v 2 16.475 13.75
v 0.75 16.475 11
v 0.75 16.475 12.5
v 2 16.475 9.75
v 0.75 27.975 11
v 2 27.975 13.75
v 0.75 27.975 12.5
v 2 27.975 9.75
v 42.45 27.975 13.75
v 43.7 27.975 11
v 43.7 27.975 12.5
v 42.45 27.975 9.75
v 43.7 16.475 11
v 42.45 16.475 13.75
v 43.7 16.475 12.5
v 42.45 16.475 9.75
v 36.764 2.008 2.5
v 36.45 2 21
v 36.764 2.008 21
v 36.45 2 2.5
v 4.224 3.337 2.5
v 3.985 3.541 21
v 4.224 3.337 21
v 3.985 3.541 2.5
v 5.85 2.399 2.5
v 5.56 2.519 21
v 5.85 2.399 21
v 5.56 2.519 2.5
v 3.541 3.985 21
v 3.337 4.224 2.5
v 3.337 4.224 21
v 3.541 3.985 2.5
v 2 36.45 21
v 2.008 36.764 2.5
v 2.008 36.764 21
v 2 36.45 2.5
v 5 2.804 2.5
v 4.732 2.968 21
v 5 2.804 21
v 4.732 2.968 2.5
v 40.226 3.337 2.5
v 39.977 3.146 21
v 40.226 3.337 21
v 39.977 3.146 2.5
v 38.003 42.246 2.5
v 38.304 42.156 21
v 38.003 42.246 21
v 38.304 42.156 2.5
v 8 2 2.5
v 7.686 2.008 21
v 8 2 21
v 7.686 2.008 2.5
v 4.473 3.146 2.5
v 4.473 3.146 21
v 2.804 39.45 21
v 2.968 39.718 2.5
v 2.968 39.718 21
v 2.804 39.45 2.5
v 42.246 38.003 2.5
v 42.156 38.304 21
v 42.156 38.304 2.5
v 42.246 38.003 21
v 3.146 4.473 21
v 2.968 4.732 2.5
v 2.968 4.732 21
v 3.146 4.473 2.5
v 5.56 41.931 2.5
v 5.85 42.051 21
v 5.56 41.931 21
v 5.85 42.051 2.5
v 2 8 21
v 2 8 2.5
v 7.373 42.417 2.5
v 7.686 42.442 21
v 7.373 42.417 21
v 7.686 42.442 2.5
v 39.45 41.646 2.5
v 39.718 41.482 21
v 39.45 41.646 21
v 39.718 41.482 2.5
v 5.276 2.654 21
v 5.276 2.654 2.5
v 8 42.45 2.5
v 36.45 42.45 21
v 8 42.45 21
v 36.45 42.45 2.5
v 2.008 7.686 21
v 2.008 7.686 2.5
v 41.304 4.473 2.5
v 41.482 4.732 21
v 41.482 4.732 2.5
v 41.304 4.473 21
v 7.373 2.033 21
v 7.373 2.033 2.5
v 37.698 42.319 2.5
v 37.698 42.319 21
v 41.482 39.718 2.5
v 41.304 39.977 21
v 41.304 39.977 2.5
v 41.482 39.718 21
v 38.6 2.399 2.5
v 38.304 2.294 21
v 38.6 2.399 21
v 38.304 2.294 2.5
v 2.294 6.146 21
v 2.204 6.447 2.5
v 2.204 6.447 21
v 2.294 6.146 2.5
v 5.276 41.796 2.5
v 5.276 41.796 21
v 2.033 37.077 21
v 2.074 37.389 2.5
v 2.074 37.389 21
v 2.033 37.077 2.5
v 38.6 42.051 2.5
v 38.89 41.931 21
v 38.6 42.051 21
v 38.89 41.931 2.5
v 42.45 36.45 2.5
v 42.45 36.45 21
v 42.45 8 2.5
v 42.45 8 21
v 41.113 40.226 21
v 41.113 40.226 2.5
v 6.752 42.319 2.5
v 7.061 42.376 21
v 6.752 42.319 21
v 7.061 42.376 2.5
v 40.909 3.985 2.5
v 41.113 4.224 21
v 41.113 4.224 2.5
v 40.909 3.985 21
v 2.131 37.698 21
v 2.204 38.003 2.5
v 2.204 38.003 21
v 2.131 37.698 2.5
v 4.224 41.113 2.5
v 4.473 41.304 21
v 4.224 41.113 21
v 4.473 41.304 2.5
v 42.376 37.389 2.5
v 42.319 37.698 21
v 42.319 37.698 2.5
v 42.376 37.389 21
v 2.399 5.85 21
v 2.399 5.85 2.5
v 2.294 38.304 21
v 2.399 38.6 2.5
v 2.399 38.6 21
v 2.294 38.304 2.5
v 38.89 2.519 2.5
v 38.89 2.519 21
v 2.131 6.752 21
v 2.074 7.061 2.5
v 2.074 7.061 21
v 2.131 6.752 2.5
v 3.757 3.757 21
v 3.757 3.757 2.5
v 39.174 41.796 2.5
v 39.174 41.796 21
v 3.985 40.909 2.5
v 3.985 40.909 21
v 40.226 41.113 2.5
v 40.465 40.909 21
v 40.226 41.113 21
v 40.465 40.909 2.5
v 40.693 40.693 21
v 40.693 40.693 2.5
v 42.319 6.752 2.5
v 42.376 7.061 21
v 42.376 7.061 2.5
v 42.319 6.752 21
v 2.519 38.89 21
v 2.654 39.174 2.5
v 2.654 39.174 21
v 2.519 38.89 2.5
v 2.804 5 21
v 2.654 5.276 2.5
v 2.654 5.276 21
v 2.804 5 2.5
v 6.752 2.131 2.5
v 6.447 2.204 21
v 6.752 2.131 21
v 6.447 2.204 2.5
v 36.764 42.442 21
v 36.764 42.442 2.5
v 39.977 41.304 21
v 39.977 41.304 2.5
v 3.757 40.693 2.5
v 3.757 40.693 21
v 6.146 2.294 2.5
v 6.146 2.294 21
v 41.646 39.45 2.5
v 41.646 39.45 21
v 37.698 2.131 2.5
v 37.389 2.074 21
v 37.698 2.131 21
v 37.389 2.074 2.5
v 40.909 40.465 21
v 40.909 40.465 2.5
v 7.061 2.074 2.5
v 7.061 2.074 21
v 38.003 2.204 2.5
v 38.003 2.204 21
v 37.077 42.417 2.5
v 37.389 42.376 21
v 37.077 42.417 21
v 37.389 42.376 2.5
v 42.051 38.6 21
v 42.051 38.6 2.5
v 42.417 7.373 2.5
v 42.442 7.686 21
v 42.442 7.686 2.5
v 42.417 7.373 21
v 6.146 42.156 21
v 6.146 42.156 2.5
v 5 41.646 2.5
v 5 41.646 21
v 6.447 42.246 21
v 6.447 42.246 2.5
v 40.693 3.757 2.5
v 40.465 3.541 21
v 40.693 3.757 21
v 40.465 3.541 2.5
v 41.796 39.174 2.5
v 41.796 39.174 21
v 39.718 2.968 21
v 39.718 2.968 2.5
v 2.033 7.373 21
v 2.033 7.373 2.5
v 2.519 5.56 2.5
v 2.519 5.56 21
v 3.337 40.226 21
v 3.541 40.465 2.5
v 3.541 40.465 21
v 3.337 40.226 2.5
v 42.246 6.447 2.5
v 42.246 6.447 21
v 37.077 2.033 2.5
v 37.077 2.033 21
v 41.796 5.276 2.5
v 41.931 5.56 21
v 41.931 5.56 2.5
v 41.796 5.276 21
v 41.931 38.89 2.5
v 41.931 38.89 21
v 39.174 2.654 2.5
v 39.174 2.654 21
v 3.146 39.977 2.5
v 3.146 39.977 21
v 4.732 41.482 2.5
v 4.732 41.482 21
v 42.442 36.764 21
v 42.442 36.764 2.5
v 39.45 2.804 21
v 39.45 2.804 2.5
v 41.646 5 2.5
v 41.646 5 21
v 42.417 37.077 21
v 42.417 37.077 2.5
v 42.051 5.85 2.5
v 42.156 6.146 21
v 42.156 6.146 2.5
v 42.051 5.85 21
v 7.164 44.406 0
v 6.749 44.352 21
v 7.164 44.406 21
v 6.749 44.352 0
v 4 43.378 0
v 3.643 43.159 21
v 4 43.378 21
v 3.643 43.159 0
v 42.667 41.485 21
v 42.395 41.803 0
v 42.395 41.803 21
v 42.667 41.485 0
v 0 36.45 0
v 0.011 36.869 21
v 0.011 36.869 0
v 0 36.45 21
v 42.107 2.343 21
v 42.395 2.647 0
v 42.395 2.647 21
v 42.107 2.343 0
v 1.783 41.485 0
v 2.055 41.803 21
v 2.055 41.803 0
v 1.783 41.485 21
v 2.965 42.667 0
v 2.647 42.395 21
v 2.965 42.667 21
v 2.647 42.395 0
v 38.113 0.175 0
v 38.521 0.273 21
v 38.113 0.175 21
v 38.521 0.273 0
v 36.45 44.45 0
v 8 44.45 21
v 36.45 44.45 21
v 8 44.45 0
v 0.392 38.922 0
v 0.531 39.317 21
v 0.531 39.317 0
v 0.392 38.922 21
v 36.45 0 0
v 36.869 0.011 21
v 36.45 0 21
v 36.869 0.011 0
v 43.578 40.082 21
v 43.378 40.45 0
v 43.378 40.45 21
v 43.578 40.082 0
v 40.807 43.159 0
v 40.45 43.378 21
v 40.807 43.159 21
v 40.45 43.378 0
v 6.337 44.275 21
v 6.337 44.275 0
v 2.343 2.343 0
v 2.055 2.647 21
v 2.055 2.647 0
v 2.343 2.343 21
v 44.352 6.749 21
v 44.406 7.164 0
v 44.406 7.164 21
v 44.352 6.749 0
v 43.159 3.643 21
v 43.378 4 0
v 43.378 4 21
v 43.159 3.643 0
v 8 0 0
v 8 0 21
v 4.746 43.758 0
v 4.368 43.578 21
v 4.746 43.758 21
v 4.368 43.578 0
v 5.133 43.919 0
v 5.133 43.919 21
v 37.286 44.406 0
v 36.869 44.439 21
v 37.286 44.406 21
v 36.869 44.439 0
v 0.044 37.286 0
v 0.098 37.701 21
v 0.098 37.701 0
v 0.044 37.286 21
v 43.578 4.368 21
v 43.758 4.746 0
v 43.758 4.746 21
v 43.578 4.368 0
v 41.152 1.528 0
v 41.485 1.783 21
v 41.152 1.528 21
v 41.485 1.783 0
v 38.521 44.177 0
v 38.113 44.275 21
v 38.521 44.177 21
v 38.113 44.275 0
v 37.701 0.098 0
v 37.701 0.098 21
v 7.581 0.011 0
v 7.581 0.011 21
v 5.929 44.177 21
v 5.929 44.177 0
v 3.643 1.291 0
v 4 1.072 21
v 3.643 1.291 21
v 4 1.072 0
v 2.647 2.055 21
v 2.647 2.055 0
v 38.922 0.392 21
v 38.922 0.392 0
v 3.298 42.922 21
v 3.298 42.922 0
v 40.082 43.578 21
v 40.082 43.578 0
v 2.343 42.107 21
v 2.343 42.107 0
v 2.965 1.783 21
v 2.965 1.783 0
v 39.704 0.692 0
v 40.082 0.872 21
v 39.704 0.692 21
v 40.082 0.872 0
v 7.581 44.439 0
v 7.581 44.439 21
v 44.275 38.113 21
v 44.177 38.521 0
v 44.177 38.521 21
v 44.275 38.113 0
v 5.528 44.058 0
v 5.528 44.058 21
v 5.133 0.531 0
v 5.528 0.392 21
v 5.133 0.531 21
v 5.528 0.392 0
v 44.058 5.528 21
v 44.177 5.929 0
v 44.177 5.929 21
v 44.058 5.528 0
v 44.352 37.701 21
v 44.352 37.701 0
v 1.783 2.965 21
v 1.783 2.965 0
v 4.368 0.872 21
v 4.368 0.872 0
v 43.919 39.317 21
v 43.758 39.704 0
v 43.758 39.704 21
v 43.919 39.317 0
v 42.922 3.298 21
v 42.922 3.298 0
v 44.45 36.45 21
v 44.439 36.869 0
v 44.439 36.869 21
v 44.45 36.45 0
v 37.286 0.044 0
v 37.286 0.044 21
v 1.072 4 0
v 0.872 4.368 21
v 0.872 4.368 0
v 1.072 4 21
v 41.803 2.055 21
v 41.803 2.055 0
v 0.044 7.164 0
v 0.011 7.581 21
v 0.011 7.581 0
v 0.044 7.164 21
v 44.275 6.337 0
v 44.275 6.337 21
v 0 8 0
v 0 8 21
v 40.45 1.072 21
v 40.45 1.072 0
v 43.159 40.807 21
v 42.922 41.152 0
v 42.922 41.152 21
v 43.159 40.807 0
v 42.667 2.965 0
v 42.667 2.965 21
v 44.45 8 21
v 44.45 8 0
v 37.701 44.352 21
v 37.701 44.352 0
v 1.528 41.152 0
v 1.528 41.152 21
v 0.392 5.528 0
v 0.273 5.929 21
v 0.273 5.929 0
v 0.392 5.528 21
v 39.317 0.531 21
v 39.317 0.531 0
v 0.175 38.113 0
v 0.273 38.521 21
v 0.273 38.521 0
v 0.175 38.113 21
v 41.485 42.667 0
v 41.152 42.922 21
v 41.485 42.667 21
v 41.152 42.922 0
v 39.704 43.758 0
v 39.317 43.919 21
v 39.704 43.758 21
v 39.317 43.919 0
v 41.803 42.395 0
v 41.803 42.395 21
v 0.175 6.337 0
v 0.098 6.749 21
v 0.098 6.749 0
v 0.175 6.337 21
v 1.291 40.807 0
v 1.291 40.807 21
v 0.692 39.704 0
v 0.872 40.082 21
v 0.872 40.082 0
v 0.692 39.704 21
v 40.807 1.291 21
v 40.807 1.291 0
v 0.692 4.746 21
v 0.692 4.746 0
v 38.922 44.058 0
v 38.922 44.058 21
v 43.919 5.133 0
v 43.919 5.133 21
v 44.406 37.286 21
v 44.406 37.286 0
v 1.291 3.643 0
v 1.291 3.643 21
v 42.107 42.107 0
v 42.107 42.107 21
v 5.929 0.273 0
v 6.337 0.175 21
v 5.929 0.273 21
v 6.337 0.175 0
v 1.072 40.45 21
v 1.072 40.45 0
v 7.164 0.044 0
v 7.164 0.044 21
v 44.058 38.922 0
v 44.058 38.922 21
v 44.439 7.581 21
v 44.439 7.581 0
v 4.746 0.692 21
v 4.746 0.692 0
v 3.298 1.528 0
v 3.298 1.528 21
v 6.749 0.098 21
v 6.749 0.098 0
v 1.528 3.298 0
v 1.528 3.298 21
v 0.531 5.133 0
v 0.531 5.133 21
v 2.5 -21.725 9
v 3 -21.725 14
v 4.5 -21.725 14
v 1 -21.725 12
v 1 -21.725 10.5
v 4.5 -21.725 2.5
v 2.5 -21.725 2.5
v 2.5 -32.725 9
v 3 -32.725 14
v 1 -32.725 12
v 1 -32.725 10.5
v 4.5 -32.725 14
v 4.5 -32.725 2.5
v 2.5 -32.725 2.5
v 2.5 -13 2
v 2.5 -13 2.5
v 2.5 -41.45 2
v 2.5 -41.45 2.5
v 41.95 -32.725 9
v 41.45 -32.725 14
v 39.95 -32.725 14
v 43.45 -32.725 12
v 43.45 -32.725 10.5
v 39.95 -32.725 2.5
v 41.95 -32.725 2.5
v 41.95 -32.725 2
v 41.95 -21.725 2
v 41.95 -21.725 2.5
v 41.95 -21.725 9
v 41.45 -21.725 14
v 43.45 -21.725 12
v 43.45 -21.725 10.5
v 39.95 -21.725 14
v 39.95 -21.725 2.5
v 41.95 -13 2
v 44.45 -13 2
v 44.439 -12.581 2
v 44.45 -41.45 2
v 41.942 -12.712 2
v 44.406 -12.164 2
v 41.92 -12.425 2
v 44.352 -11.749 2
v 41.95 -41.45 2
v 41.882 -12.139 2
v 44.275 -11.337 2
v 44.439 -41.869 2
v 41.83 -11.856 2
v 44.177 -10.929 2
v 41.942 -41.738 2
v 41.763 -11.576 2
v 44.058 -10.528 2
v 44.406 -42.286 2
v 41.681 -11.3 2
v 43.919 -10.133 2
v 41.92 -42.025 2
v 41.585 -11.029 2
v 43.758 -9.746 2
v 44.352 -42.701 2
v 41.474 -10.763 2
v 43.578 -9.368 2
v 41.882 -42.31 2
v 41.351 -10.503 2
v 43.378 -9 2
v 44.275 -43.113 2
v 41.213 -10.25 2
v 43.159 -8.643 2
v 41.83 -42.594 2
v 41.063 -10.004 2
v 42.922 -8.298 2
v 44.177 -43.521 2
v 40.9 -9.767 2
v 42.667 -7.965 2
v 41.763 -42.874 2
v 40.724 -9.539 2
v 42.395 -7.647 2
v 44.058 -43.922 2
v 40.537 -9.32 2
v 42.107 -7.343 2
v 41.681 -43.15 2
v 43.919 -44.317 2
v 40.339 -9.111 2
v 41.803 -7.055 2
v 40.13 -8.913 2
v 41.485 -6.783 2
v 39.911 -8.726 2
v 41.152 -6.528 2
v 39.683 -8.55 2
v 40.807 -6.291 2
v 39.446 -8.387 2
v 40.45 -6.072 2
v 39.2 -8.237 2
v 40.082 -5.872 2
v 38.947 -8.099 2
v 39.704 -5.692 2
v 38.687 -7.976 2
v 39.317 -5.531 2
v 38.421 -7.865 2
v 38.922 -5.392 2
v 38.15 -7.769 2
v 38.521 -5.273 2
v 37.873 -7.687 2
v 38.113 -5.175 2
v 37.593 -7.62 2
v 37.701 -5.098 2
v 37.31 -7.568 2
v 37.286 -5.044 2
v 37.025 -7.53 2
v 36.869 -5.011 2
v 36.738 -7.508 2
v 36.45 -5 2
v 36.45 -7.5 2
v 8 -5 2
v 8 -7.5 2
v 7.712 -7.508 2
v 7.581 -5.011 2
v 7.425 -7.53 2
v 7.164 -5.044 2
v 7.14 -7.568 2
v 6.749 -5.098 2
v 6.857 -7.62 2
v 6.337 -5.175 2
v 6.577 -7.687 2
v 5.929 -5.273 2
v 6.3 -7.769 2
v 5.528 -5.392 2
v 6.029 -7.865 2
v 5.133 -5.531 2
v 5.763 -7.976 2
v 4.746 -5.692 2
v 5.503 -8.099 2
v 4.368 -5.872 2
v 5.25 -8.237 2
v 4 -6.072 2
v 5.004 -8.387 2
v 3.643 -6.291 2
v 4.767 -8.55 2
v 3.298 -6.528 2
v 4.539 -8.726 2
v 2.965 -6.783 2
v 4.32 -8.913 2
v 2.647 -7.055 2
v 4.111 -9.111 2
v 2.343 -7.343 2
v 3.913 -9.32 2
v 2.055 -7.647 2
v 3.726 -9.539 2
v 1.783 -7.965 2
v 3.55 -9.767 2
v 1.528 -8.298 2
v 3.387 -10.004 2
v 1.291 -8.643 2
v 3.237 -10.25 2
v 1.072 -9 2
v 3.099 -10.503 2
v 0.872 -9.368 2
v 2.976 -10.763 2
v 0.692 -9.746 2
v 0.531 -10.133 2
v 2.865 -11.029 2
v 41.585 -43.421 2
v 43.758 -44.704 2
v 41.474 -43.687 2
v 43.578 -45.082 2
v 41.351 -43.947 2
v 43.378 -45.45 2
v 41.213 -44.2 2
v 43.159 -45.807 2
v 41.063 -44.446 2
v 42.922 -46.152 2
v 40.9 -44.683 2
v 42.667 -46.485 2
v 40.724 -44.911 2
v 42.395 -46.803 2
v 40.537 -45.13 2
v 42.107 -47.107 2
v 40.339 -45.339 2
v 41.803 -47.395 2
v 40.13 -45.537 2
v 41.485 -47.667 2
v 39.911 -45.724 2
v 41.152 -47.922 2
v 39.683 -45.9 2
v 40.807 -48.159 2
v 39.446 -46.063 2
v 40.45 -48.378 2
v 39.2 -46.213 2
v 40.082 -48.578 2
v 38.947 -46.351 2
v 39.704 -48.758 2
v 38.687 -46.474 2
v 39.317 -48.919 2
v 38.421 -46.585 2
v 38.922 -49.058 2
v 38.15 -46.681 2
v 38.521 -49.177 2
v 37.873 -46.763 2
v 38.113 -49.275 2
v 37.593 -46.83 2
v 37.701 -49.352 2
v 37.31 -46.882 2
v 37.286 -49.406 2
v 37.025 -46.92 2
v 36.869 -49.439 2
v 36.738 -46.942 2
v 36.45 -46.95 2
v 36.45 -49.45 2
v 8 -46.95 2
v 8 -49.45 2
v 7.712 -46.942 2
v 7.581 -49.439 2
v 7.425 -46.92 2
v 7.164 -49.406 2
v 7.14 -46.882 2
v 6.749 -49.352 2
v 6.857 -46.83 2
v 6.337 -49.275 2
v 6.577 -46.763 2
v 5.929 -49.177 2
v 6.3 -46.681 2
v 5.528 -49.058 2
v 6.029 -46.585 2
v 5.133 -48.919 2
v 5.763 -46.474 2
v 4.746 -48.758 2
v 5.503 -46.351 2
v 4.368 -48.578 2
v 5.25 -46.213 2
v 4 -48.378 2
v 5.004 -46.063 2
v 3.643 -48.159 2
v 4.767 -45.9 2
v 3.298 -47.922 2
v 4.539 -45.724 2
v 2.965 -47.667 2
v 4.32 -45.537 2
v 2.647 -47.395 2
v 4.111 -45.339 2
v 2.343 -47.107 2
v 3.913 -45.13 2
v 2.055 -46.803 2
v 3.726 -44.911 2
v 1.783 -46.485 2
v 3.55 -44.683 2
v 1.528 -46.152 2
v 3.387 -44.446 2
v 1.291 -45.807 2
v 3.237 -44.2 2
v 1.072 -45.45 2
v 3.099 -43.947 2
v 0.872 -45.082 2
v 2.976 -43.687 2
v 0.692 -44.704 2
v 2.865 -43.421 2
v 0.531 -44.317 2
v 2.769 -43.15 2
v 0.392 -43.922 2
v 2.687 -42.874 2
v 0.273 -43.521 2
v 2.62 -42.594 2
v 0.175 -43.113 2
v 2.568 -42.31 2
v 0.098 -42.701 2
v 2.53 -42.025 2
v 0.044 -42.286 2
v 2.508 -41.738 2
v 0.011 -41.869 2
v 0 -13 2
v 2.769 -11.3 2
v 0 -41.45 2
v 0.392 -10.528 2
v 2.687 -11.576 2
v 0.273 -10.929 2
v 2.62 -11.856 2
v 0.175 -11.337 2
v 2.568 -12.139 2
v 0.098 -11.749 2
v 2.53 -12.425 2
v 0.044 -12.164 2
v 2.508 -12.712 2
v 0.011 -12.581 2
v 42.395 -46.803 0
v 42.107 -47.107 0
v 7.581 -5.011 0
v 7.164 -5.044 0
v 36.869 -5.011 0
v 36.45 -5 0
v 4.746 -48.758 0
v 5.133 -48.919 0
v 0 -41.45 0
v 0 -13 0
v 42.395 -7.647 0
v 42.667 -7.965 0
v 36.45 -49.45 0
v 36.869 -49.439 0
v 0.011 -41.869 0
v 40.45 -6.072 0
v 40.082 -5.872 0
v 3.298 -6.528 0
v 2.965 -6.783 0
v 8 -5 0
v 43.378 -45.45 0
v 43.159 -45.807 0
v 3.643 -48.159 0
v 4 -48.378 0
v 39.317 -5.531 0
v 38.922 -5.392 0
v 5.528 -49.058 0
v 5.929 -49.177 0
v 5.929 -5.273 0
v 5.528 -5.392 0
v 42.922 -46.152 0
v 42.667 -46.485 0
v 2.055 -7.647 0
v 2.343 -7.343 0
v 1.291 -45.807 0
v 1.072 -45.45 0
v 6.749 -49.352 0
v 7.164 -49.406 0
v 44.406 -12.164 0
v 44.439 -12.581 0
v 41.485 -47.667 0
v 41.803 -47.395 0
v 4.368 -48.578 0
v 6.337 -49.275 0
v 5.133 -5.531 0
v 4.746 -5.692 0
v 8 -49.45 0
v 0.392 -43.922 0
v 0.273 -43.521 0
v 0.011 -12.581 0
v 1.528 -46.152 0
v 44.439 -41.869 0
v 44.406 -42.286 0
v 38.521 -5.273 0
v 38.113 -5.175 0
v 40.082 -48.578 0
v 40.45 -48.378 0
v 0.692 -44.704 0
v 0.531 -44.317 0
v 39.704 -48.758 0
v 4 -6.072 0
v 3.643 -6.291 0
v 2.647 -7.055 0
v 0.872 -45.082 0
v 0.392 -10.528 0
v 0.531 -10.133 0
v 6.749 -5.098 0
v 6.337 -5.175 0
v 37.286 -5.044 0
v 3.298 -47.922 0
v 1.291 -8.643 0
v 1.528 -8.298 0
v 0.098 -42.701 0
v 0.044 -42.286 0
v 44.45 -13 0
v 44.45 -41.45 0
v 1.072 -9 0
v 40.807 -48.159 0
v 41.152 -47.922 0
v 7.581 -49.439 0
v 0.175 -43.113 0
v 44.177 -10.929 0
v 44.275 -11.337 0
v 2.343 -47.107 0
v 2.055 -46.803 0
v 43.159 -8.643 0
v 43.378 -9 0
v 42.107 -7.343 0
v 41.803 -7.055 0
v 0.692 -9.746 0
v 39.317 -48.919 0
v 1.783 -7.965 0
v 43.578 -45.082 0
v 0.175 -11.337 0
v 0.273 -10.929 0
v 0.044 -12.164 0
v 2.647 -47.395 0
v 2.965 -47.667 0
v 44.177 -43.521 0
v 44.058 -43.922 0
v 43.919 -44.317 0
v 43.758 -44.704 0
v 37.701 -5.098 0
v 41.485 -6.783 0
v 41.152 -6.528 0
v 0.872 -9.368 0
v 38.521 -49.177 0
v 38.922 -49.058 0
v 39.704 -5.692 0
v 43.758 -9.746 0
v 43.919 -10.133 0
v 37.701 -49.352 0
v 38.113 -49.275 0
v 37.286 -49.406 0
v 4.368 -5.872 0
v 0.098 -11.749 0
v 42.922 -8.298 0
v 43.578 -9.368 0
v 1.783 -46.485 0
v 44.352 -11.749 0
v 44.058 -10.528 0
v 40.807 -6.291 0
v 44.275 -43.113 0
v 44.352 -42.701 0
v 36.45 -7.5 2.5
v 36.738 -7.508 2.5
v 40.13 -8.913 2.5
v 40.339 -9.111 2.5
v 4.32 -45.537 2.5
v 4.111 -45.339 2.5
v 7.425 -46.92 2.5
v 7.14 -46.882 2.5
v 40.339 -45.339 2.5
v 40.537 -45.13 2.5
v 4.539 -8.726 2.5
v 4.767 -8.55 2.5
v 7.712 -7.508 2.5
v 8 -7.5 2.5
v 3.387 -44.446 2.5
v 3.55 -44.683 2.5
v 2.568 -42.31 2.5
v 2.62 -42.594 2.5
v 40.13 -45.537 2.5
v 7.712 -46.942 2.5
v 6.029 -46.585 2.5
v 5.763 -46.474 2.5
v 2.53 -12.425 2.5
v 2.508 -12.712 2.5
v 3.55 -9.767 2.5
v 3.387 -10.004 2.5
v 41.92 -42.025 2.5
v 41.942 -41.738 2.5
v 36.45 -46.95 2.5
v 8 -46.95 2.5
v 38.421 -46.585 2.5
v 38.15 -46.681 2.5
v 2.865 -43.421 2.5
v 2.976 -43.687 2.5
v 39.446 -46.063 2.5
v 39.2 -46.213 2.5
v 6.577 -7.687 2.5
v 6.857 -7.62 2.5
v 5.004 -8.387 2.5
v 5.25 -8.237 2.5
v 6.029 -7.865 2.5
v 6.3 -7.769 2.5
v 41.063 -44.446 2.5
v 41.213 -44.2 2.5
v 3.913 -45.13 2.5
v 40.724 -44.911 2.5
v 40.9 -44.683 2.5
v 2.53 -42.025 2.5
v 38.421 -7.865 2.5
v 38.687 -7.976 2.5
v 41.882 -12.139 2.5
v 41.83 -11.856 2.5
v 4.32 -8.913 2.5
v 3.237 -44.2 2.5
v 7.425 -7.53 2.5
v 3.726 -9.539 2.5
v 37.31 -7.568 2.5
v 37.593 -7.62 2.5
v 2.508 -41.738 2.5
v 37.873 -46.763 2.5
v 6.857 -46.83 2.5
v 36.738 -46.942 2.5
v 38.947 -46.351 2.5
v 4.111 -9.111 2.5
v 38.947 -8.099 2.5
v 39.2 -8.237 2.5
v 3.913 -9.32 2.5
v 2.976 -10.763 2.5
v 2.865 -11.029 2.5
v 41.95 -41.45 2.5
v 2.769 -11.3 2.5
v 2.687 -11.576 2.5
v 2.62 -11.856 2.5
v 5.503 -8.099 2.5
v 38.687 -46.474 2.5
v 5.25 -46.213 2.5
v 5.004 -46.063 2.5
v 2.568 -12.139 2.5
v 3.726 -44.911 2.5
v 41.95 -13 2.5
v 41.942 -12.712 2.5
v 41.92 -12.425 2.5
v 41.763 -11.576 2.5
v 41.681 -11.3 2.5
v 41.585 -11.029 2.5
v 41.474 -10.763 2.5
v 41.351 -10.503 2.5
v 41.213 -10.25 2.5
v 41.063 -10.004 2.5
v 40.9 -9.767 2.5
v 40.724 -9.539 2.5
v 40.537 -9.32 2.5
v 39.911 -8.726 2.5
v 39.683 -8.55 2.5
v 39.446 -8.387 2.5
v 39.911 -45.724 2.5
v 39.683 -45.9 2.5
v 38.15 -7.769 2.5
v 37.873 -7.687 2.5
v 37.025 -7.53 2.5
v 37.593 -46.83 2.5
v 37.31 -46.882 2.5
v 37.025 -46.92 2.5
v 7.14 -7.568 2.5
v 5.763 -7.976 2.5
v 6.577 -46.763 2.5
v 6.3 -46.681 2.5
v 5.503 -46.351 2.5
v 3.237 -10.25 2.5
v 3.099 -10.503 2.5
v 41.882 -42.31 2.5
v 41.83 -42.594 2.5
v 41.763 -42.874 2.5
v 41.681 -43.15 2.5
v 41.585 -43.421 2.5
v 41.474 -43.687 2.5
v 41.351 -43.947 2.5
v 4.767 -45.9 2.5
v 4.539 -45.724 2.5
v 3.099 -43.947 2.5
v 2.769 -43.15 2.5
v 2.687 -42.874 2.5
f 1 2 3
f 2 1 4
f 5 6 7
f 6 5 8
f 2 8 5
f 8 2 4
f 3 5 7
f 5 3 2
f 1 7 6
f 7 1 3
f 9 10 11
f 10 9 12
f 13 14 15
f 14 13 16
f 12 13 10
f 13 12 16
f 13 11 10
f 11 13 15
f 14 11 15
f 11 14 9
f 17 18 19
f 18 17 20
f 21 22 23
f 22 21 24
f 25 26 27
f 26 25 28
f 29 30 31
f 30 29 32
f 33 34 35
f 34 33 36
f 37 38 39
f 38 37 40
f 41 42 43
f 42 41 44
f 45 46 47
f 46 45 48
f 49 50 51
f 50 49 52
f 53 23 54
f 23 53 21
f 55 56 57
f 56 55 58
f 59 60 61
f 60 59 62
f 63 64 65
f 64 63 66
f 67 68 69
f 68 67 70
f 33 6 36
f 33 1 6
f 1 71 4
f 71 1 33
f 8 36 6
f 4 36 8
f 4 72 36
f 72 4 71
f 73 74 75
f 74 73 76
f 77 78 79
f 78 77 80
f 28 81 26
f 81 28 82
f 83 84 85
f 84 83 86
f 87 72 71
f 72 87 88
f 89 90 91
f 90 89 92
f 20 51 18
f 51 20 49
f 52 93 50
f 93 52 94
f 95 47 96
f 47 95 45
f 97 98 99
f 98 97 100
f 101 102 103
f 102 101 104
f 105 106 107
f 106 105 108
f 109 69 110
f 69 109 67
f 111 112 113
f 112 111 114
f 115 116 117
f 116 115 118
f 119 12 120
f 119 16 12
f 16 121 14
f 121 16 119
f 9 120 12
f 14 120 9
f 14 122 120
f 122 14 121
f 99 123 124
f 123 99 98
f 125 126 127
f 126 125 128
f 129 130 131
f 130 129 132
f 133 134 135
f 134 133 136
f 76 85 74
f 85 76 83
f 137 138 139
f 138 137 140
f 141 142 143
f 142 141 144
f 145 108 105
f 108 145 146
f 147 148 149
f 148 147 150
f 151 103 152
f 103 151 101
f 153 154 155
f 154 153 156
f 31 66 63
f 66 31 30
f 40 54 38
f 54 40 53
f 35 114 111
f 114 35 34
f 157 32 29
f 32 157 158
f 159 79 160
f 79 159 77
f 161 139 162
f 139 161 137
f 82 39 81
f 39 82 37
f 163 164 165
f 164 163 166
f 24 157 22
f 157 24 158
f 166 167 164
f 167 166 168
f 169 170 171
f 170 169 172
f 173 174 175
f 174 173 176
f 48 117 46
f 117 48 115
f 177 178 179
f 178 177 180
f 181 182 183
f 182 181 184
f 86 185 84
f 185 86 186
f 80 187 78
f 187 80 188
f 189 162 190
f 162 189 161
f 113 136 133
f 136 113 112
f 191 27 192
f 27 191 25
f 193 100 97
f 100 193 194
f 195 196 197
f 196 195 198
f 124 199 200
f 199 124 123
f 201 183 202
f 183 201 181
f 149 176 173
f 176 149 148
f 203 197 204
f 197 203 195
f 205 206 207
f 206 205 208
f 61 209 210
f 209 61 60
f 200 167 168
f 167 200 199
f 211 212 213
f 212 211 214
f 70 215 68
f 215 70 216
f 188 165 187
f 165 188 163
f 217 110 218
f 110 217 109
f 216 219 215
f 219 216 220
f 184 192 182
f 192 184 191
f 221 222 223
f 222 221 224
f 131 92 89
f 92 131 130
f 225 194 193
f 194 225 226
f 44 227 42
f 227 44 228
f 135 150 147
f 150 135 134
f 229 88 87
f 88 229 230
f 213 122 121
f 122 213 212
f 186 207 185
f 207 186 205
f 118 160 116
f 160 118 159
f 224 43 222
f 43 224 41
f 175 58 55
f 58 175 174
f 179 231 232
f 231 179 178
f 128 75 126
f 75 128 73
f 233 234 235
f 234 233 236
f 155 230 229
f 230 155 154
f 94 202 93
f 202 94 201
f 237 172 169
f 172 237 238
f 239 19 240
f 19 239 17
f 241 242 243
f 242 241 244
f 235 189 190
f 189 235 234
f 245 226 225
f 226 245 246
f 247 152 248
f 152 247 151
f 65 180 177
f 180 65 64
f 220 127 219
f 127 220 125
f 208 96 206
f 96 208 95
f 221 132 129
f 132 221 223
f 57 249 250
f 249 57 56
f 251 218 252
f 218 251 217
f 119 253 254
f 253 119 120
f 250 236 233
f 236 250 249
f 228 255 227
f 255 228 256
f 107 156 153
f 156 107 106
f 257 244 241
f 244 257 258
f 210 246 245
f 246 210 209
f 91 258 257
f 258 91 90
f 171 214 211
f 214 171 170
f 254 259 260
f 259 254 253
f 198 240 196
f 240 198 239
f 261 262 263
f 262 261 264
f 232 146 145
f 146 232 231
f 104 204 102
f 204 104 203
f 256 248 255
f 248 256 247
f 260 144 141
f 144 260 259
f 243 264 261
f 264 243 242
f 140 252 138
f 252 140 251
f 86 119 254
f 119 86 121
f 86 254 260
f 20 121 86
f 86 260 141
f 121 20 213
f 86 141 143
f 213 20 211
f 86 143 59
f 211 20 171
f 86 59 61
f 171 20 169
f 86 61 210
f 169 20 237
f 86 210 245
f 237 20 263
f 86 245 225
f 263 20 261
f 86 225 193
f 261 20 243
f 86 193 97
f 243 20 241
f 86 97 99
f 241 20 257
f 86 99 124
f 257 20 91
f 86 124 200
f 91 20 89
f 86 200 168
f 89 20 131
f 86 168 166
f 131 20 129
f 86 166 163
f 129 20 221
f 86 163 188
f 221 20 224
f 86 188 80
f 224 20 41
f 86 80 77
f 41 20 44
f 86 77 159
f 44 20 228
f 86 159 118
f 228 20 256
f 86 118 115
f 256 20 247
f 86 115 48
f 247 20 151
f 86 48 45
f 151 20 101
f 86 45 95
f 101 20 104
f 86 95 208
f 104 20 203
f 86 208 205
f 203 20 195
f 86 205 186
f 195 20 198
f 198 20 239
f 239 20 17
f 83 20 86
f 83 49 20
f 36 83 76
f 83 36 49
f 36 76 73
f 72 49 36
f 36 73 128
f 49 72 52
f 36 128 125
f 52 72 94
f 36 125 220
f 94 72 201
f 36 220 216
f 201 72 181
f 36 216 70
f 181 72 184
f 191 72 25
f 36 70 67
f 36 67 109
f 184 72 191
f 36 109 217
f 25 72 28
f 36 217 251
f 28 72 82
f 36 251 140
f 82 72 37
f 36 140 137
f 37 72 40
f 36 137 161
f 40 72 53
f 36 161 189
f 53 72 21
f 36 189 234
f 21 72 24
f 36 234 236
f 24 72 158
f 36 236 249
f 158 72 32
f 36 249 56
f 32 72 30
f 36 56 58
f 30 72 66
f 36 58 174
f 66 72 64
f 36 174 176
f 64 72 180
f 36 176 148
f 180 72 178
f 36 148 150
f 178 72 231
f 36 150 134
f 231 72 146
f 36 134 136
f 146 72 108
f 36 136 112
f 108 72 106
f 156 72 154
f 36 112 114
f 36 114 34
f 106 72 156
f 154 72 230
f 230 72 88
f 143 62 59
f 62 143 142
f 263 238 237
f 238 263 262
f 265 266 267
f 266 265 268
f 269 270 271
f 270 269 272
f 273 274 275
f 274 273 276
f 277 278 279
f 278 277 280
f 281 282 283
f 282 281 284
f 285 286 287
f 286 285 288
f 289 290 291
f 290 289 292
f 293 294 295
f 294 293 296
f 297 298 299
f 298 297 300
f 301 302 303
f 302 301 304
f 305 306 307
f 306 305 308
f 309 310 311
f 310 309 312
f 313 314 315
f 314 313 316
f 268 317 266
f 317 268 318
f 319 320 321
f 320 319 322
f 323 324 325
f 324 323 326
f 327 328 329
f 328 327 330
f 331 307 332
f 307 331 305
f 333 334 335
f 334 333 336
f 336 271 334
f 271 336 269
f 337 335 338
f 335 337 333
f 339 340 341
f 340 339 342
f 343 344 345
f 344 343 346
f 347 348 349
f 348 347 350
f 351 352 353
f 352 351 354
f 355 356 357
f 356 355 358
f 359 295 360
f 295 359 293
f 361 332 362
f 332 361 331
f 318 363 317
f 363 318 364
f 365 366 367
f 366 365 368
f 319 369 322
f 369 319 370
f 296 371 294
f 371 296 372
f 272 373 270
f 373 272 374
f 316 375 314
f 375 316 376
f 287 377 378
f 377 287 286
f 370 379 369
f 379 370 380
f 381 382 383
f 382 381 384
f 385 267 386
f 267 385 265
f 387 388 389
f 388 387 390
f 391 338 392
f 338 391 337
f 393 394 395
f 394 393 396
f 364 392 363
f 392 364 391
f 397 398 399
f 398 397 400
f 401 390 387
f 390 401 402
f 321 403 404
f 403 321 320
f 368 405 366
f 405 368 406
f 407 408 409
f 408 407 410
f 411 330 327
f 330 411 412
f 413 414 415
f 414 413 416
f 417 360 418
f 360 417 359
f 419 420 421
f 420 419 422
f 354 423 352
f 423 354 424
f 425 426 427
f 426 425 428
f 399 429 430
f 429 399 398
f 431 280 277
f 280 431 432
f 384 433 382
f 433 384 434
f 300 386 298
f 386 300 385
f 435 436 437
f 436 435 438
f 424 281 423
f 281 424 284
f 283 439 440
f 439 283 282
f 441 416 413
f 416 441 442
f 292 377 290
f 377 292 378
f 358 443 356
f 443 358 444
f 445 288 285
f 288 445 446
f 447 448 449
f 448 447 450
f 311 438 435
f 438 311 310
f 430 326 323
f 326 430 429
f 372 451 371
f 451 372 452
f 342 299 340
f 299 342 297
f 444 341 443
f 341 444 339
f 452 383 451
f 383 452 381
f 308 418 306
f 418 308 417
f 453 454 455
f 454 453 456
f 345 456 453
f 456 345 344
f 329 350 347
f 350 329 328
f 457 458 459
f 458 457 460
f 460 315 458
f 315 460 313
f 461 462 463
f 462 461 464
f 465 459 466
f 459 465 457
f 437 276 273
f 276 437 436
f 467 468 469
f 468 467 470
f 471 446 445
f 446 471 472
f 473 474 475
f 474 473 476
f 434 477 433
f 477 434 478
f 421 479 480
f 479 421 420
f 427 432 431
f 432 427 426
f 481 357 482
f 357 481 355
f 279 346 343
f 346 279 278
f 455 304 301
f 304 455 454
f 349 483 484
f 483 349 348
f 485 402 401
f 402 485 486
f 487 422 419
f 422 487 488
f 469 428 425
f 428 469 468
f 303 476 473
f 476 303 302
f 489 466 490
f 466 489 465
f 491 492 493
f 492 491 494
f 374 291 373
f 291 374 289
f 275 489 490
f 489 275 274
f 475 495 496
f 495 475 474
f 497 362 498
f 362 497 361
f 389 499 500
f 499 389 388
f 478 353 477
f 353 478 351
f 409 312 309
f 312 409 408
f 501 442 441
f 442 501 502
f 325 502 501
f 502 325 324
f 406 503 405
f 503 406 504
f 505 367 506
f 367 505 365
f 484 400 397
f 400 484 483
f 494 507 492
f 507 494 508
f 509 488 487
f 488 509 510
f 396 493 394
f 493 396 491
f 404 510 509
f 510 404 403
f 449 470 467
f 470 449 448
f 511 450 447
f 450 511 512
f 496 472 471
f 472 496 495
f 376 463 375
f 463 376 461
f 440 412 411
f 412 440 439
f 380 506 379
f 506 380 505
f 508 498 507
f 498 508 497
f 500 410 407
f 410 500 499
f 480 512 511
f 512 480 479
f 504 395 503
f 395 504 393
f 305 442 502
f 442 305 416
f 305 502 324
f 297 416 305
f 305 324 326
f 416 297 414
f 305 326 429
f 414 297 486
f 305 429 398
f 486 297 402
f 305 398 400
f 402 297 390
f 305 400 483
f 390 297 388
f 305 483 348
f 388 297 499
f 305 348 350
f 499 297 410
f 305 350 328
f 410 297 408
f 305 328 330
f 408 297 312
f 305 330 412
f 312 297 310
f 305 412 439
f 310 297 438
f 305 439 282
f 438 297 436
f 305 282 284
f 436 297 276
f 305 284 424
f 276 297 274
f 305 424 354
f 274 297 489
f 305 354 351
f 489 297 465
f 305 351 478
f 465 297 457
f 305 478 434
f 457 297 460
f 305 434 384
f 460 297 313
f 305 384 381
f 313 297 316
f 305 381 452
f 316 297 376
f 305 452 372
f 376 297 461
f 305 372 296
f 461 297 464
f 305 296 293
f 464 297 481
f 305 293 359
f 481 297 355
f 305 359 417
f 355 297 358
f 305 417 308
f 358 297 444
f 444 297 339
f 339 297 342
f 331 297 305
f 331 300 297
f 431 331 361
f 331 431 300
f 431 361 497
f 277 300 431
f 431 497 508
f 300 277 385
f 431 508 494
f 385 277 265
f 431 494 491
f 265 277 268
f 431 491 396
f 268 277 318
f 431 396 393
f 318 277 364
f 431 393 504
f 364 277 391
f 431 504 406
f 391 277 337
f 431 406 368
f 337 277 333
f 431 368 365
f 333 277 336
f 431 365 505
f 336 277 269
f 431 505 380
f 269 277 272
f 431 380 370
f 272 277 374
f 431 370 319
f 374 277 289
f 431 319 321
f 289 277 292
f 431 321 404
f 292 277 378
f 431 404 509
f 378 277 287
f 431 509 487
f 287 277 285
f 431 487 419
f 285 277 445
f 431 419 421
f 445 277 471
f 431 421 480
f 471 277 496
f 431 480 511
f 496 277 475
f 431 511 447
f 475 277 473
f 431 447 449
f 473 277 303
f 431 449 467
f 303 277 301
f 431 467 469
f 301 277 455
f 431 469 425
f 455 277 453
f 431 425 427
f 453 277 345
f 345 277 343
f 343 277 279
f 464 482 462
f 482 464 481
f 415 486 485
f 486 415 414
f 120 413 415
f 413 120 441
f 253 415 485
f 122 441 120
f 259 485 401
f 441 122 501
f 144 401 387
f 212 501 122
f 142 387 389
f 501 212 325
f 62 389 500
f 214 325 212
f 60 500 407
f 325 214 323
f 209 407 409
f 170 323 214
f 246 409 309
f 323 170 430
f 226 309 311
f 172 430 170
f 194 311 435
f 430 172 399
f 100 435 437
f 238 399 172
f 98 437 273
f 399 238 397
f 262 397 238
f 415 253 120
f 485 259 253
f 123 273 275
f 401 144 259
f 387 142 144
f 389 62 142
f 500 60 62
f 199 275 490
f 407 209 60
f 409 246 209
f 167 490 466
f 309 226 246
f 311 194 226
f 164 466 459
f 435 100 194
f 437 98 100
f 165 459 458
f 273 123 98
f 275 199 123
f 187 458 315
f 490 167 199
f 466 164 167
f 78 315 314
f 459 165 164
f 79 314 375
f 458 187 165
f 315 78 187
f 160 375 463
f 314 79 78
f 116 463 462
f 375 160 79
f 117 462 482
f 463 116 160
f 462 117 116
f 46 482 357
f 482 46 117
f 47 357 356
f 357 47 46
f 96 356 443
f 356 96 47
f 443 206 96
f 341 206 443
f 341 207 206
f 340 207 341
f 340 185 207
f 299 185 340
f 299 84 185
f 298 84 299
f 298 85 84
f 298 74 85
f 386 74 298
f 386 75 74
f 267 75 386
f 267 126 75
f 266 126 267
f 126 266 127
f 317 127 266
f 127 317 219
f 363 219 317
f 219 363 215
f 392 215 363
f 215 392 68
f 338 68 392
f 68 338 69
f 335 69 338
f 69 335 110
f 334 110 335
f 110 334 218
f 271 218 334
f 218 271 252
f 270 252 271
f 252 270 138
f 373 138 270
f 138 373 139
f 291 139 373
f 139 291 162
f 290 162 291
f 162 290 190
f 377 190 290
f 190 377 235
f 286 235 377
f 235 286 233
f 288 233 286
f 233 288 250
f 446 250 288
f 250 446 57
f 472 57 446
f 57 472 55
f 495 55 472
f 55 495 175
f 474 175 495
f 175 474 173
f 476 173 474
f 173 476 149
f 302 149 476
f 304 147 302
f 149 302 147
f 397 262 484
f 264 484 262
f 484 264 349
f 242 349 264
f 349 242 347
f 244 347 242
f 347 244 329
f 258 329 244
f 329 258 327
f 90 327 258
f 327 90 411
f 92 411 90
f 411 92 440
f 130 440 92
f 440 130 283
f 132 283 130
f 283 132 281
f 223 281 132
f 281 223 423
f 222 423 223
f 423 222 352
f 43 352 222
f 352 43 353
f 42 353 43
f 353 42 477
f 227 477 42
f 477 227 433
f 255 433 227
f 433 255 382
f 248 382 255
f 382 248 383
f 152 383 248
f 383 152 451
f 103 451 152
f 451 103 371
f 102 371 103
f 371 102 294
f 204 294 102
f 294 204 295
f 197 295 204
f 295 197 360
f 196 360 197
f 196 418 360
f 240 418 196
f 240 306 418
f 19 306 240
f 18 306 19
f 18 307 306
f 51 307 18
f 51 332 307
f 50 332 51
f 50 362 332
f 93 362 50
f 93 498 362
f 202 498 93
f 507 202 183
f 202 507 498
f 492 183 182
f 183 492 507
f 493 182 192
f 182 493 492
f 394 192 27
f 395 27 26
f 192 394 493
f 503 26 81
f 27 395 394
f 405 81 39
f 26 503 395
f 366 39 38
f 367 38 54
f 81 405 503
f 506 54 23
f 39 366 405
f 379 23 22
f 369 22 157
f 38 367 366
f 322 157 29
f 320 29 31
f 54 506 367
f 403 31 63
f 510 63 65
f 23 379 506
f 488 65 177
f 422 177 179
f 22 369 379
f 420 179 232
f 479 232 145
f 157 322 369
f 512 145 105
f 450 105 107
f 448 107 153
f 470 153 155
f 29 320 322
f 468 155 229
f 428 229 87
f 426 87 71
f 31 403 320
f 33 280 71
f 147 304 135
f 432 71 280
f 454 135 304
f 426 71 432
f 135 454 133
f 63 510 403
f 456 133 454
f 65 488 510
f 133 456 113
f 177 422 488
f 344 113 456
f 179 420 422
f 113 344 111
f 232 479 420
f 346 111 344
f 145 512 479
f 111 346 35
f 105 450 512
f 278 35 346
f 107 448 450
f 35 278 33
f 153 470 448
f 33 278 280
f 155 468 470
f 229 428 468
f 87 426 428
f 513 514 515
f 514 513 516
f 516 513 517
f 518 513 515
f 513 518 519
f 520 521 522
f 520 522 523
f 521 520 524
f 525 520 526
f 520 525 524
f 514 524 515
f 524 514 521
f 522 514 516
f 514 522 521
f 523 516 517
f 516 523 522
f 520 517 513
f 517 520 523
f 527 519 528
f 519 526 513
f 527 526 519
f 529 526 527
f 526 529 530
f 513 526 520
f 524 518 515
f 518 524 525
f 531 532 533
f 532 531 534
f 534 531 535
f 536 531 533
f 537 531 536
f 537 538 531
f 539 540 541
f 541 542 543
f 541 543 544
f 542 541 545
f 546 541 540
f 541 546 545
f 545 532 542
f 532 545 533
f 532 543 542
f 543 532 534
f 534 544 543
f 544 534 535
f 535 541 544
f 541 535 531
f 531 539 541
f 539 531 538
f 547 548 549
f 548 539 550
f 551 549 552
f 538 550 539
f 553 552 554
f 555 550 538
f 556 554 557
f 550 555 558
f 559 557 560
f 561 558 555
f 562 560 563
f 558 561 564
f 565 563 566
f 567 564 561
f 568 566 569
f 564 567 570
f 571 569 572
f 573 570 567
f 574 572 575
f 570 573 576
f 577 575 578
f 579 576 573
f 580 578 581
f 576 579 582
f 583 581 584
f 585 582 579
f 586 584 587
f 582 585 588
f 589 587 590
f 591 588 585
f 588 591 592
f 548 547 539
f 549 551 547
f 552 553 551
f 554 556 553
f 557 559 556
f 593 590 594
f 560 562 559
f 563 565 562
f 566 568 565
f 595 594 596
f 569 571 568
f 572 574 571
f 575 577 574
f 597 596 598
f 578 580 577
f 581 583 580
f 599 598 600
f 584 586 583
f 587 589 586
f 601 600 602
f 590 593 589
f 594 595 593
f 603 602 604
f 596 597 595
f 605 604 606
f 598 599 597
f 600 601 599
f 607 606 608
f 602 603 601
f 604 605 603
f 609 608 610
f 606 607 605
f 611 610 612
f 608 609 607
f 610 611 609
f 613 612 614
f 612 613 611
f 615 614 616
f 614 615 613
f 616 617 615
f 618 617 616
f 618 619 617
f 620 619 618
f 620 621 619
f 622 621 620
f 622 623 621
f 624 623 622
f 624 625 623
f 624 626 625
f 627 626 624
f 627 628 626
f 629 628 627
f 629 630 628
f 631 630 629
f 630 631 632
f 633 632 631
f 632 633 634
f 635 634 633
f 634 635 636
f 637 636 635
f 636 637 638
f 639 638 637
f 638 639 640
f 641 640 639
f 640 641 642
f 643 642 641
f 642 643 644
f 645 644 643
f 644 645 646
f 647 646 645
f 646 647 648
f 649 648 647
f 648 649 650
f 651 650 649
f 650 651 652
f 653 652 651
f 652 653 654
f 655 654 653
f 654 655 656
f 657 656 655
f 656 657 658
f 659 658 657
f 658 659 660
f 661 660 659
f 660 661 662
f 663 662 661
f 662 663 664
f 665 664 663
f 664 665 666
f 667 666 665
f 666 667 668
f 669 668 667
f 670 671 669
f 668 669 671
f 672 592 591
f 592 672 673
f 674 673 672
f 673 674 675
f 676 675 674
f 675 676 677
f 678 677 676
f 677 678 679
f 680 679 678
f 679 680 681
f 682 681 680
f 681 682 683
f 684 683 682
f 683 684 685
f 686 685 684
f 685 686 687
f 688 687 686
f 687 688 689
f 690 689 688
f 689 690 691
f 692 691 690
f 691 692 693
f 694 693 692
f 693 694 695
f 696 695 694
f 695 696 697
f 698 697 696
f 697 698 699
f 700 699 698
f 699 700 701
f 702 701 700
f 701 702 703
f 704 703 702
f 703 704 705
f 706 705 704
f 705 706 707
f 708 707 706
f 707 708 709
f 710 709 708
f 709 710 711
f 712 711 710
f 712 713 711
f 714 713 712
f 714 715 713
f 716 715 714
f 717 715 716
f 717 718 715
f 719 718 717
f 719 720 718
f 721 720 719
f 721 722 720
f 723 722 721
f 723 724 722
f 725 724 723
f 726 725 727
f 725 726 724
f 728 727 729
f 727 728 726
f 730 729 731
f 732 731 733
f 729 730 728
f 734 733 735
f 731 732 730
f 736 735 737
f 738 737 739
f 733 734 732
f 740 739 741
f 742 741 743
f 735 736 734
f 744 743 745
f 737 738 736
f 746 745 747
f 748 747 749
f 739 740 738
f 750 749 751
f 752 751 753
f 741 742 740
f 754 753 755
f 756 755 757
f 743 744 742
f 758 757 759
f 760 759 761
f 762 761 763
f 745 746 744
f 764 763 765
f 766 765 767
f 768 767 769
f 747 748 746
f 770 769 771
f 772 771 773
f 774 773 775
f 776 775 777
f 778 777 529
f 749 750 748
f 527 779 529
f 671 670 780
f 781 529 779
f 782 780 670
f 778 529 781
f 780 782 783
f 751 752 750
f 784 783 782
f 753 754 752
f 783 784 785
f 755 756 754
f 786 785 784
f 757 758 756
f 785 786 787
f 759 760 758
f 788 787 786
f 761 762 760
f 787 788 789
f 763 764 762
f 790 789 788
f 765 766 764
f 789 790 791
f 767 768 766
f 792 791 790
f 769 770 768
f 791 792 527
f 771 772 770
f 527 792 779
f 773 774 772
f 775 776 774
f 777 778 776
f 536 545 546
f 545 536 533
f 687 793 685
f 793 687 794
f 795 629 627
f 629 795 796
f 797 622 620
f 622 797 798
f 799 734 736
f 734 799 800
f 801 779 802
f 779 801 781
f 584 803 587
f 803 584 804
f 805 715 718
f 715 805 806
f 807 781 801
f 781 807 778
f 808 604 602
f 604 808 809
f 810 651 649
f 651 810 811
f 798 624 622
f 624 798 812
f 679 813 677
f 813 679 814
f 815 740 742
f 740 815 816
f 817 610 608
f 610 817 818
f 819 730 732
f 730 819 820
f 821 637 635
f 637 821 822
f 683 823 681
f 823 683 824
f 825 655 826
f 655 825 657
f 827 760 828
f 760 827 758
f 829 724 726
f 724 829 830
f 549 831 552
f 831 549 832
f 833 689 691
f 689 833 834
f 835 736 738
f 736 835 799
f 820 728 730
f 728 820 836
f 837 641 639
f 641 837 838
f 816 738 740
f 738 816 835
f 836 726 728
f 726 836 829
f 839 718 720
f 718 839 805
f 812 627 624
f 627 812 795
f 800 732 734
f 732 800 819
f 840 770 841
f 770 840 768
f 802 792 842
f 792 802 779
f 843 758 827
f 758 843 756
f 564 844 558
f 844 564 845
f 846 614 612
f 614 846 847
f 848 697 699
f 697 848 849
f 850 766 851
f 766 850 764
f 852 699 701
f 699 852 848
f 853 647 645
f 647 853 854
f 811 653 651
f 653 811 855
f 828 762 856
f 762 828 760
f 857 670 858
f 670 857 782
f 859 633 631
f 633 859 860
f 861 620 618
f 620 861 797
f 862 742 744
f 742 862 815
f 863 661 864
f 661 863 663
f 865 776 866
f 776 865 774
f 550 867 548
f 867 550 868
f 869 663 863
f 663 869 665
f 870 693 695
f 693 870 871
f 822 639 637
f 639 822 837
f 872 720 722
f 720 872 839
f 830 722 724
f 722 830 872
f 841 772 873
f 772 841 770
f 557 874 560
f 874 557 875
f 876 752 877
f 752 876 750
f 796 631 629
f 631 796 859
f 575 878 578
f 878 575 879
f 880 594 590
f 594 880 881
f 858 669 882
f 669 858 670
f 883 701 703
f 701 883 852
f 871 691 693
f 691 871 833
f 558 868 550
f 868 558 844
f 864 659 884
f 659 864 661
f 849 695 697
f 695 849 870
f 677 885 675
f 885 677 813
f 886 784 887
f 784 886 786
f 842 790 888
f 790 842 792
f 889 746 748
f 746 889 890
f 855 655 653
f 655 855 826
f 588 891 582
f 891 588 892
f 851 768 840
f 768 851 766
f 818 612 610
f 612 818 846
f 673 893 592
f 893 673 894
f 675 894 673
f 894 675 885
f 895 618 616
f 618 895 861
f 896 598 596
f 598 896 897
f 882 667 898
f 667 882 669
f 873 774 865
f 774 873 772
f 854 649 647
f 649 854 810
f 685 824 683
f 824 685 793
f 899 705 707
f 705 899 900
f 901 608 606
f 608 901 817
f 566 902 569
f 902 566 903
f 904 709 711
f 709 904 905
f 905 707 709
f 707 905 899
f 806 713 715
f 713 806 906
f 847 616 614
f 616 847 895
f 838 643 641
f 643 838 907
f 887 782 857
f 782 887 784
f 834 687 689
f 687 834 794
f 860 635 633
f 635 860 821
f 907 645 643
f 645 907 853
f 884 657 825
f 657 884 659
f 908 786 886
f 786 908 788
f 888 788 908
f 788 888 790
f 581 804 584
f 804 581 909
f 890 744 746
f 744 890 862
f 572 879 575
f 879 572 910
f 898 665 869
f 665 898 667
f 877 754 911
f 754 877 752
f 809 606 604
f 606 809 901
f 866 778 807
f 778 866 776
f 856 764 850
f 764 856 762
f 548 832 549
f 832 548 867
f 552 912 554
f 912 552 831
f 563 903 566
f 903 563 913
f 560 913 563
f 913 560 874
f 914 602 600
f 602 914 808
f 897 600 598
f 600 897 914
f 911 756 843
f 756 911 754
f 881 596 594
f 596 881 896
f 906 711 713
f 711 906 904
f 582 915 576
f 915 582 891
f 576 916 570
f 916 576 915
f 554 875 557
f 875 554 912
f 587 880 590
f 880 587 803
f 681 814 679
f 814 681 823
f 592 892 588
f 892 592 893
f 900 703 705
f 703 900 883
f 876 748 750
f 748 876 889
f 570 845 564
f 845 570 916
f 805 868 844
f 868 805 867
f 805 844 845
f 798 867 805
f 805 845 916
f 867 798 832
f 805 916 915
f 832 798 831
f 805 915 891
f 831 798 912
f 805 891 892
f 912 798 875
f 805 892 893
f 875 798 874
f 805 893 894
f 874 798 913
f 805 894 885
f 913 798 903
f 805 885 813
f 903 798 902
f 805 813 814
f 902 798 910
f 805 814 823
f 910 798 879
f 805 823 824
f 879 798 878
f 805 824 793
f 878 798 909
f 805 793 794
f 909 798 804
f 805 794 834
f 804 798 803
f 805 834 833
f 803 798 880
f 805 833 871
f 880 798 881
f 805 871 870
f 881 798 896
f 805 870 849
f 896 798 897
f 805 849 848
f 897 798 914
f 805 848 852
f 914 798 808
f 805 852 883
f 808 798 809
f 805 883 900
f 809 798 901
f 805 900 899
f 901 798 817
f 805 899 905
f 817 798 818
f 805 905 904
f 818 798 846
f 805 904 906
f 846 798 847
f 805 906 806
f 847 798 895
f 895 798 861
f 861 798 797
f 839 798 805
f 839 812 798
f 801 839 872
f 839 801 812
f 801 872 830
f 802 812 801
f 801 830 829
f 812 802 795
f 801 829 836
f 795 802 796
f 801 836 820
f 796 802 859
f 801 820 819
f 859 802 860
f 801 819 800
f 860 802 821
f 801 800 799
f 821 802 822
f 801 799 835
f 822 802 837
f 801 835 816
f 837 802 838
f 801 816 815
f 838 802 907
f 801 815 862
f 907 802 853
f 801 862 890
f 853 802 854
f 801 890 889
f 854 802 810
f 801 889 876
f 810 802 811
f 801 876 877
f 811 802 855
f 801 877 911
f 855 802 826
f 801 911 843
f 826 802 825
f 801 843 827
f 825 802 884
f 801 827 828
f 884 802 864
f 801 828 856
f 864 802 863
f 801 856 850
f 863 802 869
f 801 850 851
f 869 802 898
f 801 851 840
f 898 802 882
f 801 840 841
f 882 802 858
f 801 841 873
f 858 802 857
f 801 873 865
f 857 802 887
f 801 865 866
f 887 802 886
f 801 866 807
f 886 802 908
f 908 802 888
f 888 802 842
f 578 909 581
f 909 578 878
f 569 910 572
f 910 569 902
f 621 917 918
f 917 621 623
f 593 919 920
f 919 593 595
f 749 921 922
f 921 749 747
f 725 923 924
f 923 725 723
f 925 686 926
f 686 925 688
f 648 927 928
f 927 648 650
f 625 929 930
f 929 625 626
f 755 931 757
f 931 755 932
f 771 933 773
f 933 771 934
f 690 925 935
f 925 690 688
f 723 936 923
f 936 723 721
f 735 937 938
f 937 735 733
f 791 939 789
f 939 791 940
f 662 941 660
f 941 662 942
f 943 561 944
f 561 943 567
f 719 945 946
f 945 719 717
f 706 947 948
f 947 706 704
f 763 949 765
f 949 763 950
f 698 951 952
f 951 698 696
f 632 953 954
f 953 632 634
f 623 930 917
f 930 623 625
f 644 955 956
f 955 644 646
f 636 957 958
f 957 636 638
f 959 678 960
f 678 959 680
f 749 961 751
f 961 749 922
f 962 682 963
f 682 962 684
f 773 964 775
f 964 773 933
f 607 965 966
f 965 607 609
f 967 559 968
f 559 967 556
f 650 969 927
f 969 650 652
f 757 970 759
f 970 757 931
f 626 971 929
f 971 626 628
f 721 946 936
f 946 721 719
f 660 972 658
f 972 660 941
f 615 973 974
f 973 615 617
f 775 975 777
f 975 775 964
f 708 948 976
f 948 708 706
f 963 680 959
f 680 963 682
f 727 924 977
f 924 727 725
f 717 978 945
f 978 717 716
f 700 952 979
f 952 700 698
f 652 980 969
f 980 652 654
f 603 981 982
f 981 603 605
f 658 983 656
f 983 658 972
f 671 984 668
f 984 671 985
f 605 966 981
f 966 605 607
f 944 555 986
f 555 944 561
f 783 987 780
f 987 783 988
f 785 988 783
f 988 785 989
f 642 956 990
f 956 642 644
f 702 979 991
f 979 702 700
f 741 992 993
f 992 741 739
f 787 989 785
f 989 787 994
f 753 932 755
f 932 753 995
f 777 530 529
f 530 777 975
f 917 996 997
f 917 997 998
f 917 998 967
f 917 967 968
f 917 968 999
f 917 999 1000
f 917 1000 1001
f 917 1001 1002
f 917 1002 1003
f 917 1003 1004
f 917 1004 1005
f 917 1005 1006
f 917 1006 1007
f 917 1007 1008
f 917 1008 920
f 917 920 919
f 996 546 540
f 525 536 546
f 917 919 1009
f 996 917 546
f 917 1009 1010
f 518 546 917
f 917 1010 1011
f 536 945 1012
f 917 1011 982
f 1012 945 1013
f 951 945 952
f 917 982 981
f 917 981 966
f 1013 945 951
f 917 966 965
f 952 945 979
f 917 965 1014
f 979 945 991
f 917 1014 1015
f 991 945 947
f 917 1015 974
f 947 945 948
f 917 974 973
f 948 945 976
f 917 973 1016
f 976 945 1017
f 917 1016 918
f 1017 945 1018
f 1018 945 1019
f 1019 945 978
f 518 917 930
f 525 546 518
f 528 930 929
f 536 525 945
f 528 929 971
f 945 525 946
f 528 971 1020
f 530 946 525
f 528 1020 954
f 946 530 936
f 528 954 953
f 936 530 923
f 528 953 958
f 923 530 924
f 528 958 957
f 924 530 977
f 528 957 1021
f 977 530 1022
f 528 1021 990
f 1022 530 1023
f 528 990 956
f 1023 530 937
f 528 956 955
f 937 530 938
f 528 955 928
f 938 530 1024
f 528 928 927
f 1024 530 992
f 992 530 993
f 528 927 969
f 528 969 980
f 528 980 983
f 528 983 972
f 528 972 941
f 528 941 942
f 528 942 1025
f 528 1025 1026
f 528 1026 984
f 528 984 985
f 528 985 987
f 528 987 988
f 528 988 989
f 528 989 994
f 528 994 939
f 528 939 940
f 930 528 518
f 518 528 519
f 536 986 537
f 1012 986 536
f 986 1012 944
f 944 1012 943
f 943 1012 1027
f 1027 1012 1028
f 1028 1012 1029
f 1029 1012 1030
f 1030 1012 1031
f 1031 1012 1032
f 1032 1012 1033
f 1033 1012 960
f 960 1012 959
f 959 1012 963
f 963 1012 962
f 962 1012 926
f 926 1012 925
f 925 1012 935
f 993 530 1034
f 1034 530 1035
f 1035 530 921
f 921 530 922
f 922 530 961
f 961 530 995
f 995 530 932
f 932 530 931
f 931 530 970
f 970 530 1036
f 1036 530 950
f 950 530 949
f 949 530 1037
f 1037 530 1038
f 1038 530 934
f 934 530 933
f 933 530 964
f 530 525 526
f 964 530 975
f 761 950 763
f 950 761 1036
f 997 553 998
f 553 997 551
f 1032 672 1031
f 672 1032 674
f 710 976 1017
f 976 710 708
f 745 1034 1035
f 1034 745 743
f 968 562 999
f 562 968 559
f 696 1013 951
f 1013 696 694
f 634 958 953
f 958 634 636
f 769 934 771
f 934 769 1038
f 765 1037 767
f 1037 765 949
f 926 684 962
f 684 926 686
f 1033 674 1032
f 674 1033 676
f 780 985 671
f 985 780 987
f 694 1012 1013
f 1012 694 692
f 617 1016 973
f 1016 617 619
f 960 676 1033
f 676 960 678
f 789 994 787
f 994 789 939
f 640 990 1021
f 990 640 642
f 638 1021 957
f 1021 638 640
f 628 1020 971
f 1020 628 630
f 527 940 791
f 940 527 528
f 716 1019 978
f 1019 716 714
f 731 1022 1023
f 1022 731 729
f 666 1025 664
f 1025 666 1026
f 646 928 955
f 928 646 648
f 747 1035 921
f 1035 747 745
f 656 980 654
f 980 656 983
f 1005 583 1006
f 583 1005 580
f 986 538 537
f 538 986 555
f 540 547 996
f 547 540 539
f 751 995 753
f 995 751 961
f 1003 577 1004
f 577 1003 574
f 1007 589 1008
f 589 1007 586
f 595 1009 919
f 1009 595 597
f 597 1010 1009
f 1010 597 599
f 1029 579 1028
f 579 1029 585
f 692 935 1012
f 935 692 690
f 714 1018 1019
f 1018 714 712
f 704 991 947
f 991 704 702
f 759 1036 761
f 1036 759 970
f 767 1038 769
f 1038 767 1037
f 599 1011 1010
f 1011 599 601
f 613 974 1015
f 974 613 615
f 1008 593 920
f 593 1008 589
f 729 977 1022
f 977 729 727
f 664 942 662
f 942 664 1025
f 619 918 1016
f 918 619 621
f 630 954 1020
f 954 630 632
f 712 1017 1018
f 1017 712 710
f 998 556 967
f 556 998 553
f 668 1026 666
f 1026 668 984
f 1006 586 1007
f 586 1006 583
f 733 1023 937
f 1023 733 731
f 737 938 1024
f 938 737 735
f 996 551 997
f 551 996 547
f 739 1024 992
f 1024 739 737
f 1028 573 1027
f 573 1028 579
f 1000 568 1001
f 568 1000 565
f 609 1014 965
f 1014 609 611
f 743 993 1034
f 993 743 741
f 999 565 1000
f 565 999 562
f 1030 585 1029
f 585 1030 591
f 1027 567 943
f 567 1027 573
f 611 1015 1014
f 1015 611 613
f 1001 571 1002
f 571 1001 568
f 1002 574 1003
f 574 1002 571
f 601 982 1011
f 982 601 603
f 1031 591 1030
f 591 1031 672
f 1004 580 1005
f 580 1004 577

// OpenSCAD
boxWidth      = 44.45;  // [5.0:0.1:1000]
boxDepth      = 44.45;  // [5.0:0.1:1000]
boxHeight     = 21  ;   // [5.0:0.1:1000]
floorThick    =  2.5;   // [0.1:0.1:  10]
wallThick     =  2.0;   // [0.1:0.1:  10]
cornerRadius  =  8.0;   // [0.1:0.1:  50]
lidLip        =  2.0;   // [0.1:0.1:  10] 
lidThick      =  2.5;   // [0.1:0.1:  10]
lidGap        =  0.5;   // [0.1:0.1:   2]
tabWidth      = 12  ;   // [5.0:0.1:  30]
tabLength     = 12  ;   // [5.0:0.1:  30] 
tabThick      =  2.0;   // [0.5:0.1:  10] 
tabDepth      =  1.5;   // [0.5:0.1:  10]
tabEnd        = tabThick+tabDepth;
tabSnub       =  1.5;   // [0.5:0.1:  10]
tabSlant      = tabThick-tabSnub+tabDepth;

sideHoleDia   =  6.5;
sideHoleInset = 13.0;
sideHoleElev  = floorThick + sideHoleDia/2 + 5;

baseHoleDia   =  7.0;
baseHoleInset = 14.0;

sideSlitDia   =  4.0;
sideSlitDepth = 10.0;
sideSlitInset = 24.0;

facets        =120  ;

$fn=facets;

box();
lidOnPlate();

module boxWithHoles()
{ difference()
    { box();
        
      sideHole();
      baseHole();
      sideSlit();
    }
}

module box()
{ difference()
    { linear_extrude( boxHeight )
        base();
      
      union()
        { translate([0,0,floorThick])
            linear_extrude( boxHeight )
              inside();  
            
          tabs( 0.5 );
        }
    }
}

module lidOnPlate()
{ translate([0,-5,boxHeight+lidLip])
    rotate( [180,0,0] )
      lid();
}

module lid()
{ translate( [0,0,boxHeight] )
    linear_extrude( lidLip )
      base();
    
  translate( [0,0,boxHeight+lidLip-lidThick] )
    linear_extrude( lidThick )
      inset(d=wallThick+lidGap)
        base();
    
  tabs();
}

module sideHole()
{ translate( [sideHoleInset,wallThick*1.5,sideHoleElev] )
    rotate( [90,0,0] )
      linear_extrude( wallThick*2 )
        circle( d=sideHoleDia );
}

module baseHole()
{ translate( [boxWidth-baseHoleInset,baseHoleInset,-floorThick/2] )
    linear_extrude( floorThick*2 )
        circle( d=sideHoleDia );
}

module sideSlit()
{ translate( [sideSlitInset,boxDepth+wallThick/2,boxHeight-sideSlitDepth] )
    rotate( [0,-90,90] )
      linear_extrude( wallThick*2 )
        union()
          { circle( d=sideSlitDia );
            polygon(points=[[ sideSlitDepth+1, sideSlitDia/2 ],
                            [ sideSlitDepth+1,-sideSlitDia/2 ],
                            [               0,-sideSlitDia/2 ],
                            [               0, sideSlitDia/2 ]],
                    paths =[[0,1,2,3,0]] );
          }
}

module inside()
{ inset(d=wallThick)
    base();
}

module base()
{ rounding(r=cornerRadius)
    polygon(points=[[ boxWidth, boxDepth ],
                    [        0, boxDepth ],
                    [        0,        0 ],   
                    [ boxWidth,        0 ]],
            paths =[[0,1,2,3,0]] );
}


module tabs( gapSpace=1 )
{ translate( [wallThick+lidGap*gapSpace,boxDepth/2-tabWidth/2,0] )
    tab( gapSpace*lidGap*2 ); 
    
  translate( [boxWidth-wallThick-lidGap*gapSpace,boxDepth/2+tabWidth/2,0] )
    rotate( [0,0,180] )
      tab( gapSpace*lidGap*2 ); 
    
}

module tab( tabGap=0 )
{ translate( [0,0,boxHeight] )
    rotate( [270,0,0] )
      translate( [0,0,tabGap/2] )
        linear_extrude( tabWidth-tabGap )
          polygon(points=[[                0,                                  0 ],
                          [ tabThick        ,                                  0 ],
                          [ tabThick        ,tabLength                           ],
                          [ tabThick-tabSnub,tabLength                           ],
                          [-tabDepth        ,tabLength-tabSlant                  ],
                          [-tabDepth        ,tabLength-tabSlant-tabSnub          ],
                          [                0,tabLength-tabSlant-tabSnub-tabDepth ]],
                  paths =[[0,1,2,3,4,5,6,0]] );
}

// Copyright (c) 2013 Oskar Linde. All rights reserved.
// License: BSD
//
// This library contains basic 2D morphology operations
//
// outset(d=1)            - creates a polygon at an offset d outside a 2D shape
// inset(d=1)             - creates a polygon at an offset d inside a 2D shape
// fillet(r=1)            - adds fillets of radius r to all concave corners of a 2D shape
// rounding(r=1)          - adds rounding to all convex corners of a 2D shape
// shell(d,center=false)  - makes a shell of width d along the edge of a 2D shape
//                        - positive values of d places the shell on the outside
//                        - negative values of d places the shell on the inside
//                        - center=true and positive d places the shell centered on the edge

module outset(d=1) {
	// Bug workaround for older OpenSCAD versions
	if (version_num() < 20130424) render() outset_extruded(d) children();
	else minkowski() {
		circle(r=d);
		children();
	}
}

module outset_extruded(d=1) {
   projection(cut=true) minkowski() {
        cylinder(r=d);
        linear_extrude(center=true) children();
   }
}

module inset(d=1) {
	 render() inverse() outset(d=d) inverse() children();
}

module fillet(r=1) {
	inset(d=r) render() outset(d=r) children();
}

module rounding(r=1) {
	outset(d=r) inset(d=r) children();
}

module shell(d,center=false) {
	if (center && d > 0) {
		difference() {
			outset(d=d/2) children();
			inset(d=d/2) children();
		}
	}
	if (!center && d > 0) {
		difference() {
			outset(d=d) children();
			children();
		}
	}
	if (!center && d < 0) {
		difference() {
			children();
			inset(d=-d) children();
		}
	}
	if (d == 0) children();
}


// Below are for internal use only

module inverse() {
	difference() {
		square(1e5,center=true);
		children();
	}
}
